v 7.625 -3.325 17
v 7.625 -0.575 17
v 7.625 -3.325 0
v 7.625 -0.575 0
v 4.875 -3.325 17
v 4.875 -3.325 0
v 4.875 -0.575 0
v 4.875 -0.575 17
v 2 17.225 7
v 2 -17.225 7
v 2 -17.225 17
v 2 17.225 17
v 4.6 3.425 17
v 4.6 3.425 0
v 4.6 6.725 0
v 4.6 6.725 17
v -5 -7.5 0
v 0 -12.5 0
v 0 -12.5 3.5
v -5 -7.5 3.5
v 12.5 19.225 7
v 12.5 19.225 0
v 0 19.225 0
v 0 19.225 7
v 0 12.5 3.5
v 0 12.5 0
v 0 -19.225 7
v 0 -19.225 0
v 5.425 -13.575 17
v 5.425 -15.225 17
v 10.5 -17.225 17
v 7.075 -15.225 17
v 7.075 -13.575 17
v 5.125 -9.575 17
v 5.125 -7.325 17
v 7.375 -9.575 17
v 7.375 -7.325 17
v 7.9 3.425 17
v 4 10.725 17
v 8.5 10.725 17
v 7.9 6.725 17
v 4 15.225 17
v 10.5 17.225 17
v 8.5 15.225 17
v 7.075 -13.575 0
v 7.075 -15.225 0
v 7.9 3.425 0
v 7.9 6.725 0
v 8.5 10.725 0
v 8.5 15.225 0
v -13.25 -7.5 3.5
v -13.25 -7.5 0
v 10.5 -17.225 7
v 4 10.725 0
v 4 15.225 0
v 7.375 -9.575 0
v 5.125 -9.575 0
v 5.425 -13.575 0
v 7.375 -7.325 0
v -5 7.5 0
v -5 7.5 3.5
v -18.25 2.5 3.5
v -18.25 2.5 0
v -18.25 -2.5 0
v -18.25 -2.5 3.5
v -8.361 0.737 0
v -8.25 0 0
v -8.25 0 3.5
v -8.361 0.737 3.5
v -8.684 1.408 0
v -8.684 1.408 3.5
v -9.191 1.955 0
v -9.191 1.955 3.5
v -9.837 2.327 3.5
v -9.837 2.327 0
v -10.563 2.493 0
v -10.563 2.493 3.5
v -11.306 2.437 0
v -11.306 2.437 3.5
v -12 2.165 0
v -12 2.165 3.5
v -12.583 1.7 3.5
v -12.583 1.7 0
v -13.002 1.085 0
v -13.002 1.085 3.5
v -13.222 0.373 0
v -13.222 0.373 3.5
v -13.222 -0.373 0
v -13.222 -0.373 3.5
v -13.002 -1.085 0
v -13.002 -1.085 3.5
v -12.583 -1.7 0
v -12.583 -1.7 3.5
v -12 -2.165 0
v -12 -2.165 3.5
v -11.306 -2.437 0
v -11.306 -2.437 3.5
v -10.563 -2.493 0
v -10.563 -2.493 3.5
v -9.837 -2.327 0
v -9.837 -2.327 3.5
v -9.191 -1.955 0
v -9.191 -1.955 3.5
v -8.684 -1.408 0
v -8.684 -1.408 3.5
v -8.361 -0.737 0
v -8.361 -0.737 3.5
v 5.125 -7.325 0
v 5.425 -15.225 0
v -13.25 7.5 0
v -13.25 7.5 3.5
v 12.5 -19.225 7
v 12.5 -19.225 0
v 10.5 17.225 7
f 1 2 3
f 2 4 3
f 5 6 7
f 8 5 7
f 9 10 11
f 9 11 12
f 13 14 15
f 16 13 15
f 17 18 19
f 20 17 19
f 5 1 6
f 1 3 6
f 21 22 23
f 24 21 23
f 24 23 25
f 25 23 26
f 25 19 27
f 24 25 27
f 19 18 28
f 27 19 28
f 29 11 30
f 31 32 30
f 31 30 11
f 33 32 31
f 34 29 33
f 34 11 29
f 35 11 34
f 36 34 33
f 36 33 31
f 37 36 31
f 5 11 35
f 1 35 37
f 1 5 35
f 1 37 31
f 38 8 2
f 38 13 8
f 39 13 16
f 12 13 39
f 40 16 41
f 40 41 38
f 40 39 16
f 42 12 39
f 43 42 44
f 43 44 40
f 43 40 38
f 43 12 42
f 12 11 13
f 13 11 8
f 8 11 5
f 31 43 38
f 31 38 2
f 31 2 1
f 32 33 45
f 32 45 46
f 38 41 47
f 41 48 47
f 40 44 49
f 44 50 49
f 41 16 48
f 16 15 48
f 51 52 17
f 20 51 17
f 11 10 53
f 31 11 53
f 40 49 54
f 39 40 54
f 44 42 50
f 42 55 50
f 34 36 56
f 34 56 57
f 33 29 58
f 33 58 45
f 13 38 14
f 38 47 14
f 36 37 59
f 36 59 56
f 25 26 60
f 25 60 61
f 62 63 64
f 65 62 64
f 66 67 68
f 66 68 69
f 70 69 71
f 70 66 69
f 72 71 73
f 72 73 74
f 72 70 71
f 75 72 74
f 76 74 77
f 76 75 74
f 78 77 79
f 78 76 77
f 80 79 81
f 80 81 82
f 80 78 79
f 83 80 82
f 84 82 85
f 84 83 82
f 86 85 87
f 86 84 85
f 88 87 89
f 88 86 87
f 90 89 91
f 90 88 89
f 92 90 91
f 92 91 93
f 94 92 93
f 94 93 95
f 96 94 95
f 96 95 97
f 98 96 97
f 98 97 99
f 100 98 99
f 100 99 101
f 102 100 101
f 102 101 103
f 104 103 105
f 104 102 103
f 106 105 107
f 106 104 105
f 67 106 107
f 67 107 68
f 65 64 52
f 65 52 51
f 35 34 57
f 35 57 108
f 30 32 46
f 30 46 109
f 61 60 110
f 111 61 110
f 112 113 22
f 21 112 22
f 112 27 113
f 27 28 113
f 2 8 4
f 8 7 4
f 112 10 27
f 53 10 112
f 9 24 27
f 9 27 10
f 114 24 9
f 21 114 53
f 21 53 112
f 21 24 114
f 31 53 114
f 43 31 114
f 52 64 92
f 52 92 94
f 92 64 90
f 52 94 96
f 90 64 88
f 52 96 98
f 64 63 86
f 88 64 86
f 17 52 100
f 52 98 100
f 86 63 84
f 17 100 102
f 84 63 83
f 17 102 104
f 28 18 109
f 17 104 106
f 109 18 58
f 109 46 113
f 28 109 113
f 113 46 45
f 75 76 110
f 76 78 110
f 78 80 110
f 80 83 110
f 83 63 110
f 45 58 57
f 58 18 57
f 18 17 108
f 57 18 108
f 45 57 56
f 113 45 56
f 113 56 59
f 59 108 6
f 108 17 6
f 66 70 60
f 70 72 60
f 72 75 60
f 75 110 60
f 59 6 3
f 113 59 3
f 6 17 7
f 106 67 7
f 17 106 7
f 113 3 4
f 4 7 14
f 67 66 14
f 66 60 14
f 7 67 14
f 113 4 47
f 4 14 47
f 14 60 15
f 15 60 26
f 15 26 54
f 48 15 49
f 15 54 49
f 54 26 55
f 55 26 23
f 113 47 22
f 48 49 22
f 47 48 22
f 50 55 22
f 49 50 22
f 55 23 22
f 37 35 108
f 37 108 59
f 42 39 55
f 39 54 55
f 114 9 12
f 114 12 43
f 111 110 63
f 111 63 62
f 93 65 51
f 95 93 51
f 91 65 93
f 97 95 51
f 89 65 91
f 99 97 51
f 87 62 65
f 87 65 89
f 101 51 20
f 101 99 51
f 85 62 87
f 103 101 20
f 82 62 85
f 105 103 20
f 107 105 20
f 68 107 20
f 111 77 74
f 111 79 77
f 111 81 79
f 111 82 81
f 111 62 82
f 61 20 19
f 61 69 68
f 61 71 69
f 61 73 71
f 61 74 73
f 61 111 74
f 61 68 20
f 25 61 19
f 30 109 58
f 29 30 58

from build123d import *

# Parameters (mm, degrees)
F0_W     = 1.65
F0_H     = 1.65
F0_W_2   = 2.25
F0_H_2   = 2.25
F0_W_3   = 2.75
F0_H_3   = 2.75
F0_R     = 2.5
F0_W_4   = 3.3
F0_H_4   = 3.3
F0_W_5   = 4.5
F0_H_5   = 4.5
F1_DEPTH = 3.5
F2_W     = 1.65
F2_H     = 1.65
F2_W_2   = 2.25
F2_H_2   = 2.25
F2_W_3   = 2.75
F2_H_3   = 2.75
F2_W_4   = 3.3
F2_H_4   = 3.3
F2_W_5   = 4.5
F2_H_5   = 4.5
F3_DEPTH = 3.5
F4_W     = 8.5
F4_H     = 34.45
F5_DEPTH = 10
F6_SIZE  = 5


with BuildPart() as f1:
    # F0 (on Top) → F1 (new body)
    with BuildSketch(Plane.XY):
        Polygon((12.5, 19.225), (0, 19.225), (0, 7.5), (-18.25, 7.5), (-18.25, -7.5), (0, -7.5), (0, -19.225), (12.5, -19.225), align=None)
        with Locations((6.25, -14.4)):
            Rectangle(F0_W, F0_H, mode=Mode.SUBTRACT)
        with Locations((6.25, -8.45)):
            Rectangle(F0_W_2, F0_H_2, mode=Mode.SUBTRACT)
        with Locations((6.25, -1.95)):
            Rectangle(F0_W_3, F0_H_3, mode=Mode.SUBTRACT)
        with Locations((-10.75, 0)):
            Circle(F0_R, mode=Mode.SUBTRACT)
        with Locations((6.25, 5.075)):
            Rectangle(F0_W_4, F0_H_4, mode=Mode.SUBTRACT)
        with Locations((6.25, 12.975)):
            Rectangle(F0_W_5, F0_H_5, mode=Mode.SUBTRACT)
    extrude(amount=F1_DEPTH)

    # F2 (on face) → F3 (join)
    with BuildSketch(Plane.XY.offset(3.5)):
        Polygon((12.5, 19.225), (0, 19.225), (0, 7.5), (0, -7.5), (0, -19.225), (12.5, -19.225), align=None)
        with Locations((6.25, -14.4)):
            Rectangle(F2_W, F2_H, mode=Mode.SUBTRACT)
        with Locations((6.25, -8.45)):
            Rectangle(F2_W_2, F2_H_2, mode=Mode.SUBTRACT)
        with Locations((6.25, -1.95)):
            Rectangle(F2_W_3, F2_H_3, mode=Mode.SUBTRACT)
        with Locations((6.25, 5.075)):
            Rectangle(F2_W_4, F2_H_4, mode=Mode.SUBTRACT)
        with Locations((6.25, 12.975)):
            Rectangle(F2_W_5, F2_H_5, mode=Mode.SUBTRACT)
    extrude(amount=F3_DEPTH)

    # F4 (on face) → F5 (join)
    with BuildSketch(Plane.XY.offset(7)):
        with Locations((6.25, 0)):
            Rectangle(F4_W, F4_H)
        Polygon((5.425, -13.575), (6.75, -13.575), (7.075, -13.575), (7.075, -14.5), (7.075, -15.225), (6.75, -15.225), (5.425, -15.225), (5.425, -14.5), align=None, mode=Mode.SUBTRACT)
        Polygon((5.125, -7.325), (7, -7.325), (7.375, -7.325), (7.375, -9), (7.375, -9.575), (7, -9.575), (5.125, -9.575), (5.125, -9), align=None, mode=Mode.SUBTRACT)
        Polygon((4.875, -0.575), (7.25, -0.575), (7.625, -0.575), (7.625, -3), (7.625, -3.325), (7.25, -3.325), (4.875, -3.325), (4.875, -3), align=None, mode=Mode.SUBTRACT)
        Polygon((4.6, 6.725), (7.5, 6.725), (7.9, 6.725), (7.9, 6.5), (7.9, 3.5), (7.9, 3.425), (7.5, 3.425), (4.6, 3.425), (4.6, 3.5), (4.6, 6.5), align=None, mode=Mode.SUBTRACT)
        Polygon((8, 10.725), (4, 10.725), (4, 14.5), (4, 15.225), (8, 15.225), (8.5, 15.225), (8.5, 14.5), (8.5, 10.725), align=None, mode=Mode.SUBTRACT)
    extrude(amount=F5_DEPTH)

    # F6
    f6_edges = [f1.edges().sort_by_distance(p)[0] for p in [
        (0, 7.5, 1.75),
        (0, -7.5, 1.75),
        (-18.25, -7.5, 1.75),
        (-18.25, 7.5, 1.75),
    ]]
    chamfer(f6_edges, length=F6_SIZE)


solid = f1.part
